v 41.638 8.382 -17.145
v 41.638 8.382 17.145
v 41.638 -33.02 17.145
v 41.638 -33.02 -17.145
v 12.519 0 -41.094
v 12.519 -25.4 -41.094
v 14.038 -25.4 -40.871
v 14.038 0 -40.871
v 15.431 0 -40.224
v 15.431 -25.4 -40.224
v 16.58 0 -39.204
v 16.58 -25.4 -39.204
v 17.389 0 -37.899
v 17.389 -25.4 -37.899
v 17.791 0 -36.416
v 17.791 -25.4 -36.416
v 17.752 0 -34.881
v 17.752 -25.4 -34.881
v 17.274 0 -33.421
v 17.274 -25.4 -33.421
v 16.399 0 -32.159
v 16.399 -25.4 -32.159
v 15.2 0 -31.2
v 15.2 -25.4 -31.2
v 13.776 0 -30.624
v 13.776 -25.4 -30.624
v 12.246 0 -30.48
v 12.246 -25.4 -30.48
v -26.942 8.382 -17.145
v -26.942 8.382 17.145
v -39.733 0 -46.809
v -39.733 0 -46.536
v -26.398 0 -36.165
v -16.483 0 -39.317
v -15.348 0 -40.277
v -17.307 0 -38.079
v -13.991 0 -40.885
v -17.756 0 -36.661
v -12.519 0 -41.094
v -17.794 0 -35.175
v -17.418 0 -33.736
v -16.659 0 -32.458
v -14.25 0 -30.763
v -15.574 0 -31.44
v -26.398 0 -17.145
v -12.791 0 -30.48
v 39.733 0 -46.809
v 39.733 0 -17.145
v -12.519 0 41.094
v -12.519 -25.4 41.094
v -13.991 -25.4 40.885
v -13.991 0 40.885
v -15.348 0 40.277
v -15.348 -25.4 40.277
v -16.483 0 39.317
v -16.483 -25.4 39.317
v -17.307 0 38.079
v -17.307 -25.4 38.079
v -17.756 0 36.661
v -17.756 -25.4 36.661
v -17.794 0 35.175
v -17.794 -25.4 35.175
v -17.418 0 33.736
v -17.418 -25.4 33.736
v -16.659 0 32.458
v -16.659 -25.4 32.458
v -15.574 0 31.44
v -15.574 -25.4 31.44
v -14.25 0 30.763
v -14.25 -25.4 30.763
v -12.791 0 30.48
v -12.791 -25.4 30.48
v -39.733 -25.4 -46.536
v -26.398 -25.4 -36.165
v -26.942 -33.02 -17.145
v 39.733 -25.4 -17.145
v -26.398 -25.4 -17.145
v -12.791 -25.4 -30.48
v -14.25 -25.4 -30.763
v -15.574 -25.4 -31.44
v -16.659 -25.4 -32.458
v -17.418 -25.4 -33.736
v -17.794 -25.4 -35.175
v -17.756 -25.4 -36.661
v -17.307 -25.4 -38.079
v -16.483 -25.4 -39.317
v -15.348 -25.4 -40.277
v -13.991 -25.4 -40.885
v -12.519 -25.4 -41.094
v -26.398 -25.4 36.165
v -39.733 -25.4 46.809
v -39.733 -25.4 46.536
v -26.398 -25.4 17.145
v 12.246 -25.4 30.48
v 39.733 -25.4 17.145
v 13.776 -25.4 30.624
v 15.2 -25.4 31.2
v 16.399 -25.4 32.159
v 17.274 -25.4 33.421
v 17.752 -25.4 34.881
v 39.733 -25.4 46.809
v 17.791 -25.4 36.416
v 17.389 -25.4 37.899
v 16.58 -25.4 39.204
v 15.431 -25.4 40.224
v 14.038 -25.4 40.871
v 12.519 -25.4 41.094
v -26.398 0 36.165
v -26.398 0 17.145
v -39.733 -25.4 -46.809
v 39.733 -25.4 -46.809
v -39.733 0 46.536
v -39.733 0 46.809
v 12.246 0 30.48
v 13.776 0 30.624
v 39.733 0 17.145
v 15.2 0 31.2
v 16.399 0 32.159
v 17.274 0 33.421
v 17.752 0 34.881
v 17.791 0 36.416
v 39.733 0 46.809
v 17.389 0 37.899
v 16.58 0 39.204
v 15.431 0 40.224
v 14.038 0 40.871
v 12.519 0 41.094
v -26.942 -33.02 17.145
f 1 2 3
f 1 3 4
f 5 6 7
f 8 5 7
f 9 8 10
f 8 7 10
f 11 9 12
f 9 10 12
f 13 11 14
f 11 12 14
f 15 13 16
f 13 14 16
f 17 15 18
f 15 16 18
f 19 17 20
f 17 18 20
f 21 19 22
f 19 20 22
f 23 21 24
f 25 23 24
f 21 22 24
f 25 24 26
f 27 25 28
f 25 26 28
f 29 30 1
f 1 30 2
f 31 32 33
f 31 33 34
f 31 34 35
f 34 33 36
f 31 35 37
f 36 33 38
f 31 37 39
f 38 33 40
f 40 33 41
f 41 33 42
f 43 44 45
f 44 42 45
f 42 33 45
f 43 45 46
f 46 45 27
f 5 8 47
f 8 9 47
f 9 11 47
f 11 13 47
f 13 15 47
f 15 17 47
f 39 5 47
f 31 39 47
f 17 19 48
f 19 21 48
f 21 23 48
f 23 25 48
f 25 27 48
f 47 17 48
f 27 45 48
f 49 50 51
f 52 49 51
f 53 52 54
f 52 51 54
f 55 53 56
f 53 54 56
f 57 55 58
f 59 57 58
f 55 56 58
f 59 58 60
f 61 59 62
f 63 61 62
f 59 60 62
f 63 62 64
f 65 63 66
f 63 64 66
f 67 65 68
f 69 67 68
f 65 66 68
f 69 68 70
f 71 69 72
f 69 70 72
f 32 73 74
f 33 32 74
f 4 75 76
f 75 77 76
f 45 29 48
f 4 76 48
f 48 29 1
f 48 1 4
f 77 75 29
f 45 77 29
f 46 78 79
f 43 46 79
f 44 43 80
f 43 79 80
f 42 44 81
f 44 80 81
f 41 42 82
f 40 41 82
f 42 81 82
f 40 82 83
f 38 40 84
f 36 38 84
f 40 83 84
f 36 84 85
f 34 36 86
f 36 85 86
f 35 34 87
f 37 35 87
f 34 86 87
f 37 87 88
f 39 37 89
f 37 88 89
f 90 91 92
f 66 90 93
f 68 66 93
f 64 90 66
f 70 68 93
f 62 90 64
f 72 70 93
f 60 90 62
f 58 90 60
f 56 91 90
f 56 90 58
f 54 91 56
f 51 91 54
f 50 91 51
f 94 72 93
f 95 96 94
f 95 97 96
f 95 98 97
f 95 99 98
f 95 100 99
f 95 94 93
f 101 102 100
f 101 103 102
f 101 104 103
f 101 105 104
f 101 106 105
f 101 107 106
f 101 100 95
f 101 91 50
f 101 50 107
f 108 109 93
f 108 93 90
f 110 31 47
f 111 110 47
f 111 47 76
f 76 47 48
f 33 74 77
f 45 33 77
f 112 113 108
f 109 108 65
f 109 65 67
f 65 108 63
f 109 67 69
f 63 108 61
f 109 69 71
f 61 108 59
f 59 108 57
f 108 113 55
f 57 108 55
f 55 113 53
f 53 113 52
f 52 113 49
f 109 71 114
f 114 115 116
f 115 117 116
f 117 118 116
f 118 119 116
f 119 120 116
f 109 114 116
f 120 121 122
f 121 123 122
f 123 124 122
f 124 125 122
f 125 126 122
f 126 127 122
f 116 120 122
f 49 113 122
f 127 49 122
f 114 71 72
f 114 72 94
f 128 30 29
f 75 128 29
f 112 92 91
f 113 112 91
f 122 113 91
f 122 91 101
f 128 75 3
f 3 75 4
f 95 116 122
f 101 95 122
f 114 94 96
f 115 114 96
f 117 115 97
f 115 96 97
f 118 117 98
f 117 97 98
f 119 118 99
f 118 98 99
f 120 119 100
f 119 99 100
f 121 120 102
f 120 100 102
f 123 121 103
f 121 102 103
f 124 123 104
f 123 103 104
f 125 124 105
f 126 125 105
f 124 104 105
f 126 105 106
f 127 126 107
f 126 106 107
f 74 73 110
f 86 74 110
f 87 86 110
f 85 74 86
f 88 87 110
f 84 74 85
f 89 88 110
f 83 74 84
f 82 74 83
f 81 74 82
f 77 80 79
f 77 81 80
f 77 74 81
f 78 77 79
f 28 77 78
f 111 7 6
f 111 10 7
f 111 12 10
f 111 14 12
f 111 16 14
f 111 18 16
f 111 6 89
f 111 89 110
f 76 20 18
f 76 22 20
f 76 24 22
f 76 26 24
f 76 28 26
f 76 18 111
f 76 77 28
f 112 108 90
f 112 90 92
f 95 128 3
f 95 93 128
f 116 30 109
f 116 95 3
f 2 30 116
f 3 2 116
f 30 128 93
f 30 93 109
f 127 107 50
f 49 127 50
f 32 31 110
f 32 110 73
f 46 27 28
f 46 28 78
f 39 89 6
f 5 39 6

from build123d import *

# Parameters (mm, degrees)
F0_W      = 79.465718
F0_H      = 93.617142
F1_DEPTH  = 25.4
F3_DEPTH  = 50.292
F5_DEPTH  = 133.096
F6_W      = 68.579998
F6_H      = 34.29
F7_DEPTH  = 8.382
F7_FACE_W = 68.579998
F7_FACE_H = 34.29
F8_DEPTH  = 41.402


with BuildPart() as f1:
    # F0 (on Front) → F1 (new body)
    with BuildSketch(Plane.XZ):
        Rectangle(F0_W, F0_H)
    extrude(amount=F1_DEPTH)

    # F2 (on face) → F3 (cut)
    with BuildSketch(Plane.XZ.offset(25.4)):
        with BuildLine():
            ThreePointArc((-12.518571, 41.093569), (-17.8271, 35.919412), (-12.790714, 30.480001))
            Line((-12.790714, 30.480001), (12.246429, 30.480001))
            ThreePointArc((12.246429, 30.480001), (17.8271, 35.64718), (12.518571, 41.093569))
            Line((12.518571, 41.093569), (-12.518571, 41.093569))
        make_face()
        with BuildLine():
            ThreePointArc((12.518571, -41.093569), (17.8271, -35.64718), (12.246429, -30.480001))
            Line((12.246429, -30.480001), (-12.790714, -30.480001))
            ThreePointArc((-12.790714, -30.480001), (-17.8271, -35.919412), (-12.518571, -41.093569))
            Line((-12.518571, -41.093569), (12.518571, -41.093569))
        make_face()
    extrude(amount=-F3_DEPTH, mode=Mode.SUBTRACT)

    # F4 (on Front) → F5 (cut)
    with BuildSketch(Plane.XZ):
        Polygon((-26.397856, -36.16475), (-26.397856, 36.16475), (-42.18214, 48.441429), (-44.631425, -50.34643), align=None)
    extrude(amount=F5_DEPTH, mode=Mode.SUBTRACT)

    # F6 (on Front) → F7 (join)
    with BuildSketch(Plane.XZ):
        with Locations((7.347856, 0)):
            Rectangle(F6_W, F6_H)
    extrude(amount=-F7_DEPTH)

    # F7_face (on face) → F8 (join)
    with BuildSketch(Plane(origin=(7.347856, 8.382, 0), x_dir=(1, 0, 0), z_dir=(0, 1, 0))):
        Rectangle(F7_FACE_W, F7_FACE_H)
    extrude(amount=-F8_DEPTH)


solid = f1.part
